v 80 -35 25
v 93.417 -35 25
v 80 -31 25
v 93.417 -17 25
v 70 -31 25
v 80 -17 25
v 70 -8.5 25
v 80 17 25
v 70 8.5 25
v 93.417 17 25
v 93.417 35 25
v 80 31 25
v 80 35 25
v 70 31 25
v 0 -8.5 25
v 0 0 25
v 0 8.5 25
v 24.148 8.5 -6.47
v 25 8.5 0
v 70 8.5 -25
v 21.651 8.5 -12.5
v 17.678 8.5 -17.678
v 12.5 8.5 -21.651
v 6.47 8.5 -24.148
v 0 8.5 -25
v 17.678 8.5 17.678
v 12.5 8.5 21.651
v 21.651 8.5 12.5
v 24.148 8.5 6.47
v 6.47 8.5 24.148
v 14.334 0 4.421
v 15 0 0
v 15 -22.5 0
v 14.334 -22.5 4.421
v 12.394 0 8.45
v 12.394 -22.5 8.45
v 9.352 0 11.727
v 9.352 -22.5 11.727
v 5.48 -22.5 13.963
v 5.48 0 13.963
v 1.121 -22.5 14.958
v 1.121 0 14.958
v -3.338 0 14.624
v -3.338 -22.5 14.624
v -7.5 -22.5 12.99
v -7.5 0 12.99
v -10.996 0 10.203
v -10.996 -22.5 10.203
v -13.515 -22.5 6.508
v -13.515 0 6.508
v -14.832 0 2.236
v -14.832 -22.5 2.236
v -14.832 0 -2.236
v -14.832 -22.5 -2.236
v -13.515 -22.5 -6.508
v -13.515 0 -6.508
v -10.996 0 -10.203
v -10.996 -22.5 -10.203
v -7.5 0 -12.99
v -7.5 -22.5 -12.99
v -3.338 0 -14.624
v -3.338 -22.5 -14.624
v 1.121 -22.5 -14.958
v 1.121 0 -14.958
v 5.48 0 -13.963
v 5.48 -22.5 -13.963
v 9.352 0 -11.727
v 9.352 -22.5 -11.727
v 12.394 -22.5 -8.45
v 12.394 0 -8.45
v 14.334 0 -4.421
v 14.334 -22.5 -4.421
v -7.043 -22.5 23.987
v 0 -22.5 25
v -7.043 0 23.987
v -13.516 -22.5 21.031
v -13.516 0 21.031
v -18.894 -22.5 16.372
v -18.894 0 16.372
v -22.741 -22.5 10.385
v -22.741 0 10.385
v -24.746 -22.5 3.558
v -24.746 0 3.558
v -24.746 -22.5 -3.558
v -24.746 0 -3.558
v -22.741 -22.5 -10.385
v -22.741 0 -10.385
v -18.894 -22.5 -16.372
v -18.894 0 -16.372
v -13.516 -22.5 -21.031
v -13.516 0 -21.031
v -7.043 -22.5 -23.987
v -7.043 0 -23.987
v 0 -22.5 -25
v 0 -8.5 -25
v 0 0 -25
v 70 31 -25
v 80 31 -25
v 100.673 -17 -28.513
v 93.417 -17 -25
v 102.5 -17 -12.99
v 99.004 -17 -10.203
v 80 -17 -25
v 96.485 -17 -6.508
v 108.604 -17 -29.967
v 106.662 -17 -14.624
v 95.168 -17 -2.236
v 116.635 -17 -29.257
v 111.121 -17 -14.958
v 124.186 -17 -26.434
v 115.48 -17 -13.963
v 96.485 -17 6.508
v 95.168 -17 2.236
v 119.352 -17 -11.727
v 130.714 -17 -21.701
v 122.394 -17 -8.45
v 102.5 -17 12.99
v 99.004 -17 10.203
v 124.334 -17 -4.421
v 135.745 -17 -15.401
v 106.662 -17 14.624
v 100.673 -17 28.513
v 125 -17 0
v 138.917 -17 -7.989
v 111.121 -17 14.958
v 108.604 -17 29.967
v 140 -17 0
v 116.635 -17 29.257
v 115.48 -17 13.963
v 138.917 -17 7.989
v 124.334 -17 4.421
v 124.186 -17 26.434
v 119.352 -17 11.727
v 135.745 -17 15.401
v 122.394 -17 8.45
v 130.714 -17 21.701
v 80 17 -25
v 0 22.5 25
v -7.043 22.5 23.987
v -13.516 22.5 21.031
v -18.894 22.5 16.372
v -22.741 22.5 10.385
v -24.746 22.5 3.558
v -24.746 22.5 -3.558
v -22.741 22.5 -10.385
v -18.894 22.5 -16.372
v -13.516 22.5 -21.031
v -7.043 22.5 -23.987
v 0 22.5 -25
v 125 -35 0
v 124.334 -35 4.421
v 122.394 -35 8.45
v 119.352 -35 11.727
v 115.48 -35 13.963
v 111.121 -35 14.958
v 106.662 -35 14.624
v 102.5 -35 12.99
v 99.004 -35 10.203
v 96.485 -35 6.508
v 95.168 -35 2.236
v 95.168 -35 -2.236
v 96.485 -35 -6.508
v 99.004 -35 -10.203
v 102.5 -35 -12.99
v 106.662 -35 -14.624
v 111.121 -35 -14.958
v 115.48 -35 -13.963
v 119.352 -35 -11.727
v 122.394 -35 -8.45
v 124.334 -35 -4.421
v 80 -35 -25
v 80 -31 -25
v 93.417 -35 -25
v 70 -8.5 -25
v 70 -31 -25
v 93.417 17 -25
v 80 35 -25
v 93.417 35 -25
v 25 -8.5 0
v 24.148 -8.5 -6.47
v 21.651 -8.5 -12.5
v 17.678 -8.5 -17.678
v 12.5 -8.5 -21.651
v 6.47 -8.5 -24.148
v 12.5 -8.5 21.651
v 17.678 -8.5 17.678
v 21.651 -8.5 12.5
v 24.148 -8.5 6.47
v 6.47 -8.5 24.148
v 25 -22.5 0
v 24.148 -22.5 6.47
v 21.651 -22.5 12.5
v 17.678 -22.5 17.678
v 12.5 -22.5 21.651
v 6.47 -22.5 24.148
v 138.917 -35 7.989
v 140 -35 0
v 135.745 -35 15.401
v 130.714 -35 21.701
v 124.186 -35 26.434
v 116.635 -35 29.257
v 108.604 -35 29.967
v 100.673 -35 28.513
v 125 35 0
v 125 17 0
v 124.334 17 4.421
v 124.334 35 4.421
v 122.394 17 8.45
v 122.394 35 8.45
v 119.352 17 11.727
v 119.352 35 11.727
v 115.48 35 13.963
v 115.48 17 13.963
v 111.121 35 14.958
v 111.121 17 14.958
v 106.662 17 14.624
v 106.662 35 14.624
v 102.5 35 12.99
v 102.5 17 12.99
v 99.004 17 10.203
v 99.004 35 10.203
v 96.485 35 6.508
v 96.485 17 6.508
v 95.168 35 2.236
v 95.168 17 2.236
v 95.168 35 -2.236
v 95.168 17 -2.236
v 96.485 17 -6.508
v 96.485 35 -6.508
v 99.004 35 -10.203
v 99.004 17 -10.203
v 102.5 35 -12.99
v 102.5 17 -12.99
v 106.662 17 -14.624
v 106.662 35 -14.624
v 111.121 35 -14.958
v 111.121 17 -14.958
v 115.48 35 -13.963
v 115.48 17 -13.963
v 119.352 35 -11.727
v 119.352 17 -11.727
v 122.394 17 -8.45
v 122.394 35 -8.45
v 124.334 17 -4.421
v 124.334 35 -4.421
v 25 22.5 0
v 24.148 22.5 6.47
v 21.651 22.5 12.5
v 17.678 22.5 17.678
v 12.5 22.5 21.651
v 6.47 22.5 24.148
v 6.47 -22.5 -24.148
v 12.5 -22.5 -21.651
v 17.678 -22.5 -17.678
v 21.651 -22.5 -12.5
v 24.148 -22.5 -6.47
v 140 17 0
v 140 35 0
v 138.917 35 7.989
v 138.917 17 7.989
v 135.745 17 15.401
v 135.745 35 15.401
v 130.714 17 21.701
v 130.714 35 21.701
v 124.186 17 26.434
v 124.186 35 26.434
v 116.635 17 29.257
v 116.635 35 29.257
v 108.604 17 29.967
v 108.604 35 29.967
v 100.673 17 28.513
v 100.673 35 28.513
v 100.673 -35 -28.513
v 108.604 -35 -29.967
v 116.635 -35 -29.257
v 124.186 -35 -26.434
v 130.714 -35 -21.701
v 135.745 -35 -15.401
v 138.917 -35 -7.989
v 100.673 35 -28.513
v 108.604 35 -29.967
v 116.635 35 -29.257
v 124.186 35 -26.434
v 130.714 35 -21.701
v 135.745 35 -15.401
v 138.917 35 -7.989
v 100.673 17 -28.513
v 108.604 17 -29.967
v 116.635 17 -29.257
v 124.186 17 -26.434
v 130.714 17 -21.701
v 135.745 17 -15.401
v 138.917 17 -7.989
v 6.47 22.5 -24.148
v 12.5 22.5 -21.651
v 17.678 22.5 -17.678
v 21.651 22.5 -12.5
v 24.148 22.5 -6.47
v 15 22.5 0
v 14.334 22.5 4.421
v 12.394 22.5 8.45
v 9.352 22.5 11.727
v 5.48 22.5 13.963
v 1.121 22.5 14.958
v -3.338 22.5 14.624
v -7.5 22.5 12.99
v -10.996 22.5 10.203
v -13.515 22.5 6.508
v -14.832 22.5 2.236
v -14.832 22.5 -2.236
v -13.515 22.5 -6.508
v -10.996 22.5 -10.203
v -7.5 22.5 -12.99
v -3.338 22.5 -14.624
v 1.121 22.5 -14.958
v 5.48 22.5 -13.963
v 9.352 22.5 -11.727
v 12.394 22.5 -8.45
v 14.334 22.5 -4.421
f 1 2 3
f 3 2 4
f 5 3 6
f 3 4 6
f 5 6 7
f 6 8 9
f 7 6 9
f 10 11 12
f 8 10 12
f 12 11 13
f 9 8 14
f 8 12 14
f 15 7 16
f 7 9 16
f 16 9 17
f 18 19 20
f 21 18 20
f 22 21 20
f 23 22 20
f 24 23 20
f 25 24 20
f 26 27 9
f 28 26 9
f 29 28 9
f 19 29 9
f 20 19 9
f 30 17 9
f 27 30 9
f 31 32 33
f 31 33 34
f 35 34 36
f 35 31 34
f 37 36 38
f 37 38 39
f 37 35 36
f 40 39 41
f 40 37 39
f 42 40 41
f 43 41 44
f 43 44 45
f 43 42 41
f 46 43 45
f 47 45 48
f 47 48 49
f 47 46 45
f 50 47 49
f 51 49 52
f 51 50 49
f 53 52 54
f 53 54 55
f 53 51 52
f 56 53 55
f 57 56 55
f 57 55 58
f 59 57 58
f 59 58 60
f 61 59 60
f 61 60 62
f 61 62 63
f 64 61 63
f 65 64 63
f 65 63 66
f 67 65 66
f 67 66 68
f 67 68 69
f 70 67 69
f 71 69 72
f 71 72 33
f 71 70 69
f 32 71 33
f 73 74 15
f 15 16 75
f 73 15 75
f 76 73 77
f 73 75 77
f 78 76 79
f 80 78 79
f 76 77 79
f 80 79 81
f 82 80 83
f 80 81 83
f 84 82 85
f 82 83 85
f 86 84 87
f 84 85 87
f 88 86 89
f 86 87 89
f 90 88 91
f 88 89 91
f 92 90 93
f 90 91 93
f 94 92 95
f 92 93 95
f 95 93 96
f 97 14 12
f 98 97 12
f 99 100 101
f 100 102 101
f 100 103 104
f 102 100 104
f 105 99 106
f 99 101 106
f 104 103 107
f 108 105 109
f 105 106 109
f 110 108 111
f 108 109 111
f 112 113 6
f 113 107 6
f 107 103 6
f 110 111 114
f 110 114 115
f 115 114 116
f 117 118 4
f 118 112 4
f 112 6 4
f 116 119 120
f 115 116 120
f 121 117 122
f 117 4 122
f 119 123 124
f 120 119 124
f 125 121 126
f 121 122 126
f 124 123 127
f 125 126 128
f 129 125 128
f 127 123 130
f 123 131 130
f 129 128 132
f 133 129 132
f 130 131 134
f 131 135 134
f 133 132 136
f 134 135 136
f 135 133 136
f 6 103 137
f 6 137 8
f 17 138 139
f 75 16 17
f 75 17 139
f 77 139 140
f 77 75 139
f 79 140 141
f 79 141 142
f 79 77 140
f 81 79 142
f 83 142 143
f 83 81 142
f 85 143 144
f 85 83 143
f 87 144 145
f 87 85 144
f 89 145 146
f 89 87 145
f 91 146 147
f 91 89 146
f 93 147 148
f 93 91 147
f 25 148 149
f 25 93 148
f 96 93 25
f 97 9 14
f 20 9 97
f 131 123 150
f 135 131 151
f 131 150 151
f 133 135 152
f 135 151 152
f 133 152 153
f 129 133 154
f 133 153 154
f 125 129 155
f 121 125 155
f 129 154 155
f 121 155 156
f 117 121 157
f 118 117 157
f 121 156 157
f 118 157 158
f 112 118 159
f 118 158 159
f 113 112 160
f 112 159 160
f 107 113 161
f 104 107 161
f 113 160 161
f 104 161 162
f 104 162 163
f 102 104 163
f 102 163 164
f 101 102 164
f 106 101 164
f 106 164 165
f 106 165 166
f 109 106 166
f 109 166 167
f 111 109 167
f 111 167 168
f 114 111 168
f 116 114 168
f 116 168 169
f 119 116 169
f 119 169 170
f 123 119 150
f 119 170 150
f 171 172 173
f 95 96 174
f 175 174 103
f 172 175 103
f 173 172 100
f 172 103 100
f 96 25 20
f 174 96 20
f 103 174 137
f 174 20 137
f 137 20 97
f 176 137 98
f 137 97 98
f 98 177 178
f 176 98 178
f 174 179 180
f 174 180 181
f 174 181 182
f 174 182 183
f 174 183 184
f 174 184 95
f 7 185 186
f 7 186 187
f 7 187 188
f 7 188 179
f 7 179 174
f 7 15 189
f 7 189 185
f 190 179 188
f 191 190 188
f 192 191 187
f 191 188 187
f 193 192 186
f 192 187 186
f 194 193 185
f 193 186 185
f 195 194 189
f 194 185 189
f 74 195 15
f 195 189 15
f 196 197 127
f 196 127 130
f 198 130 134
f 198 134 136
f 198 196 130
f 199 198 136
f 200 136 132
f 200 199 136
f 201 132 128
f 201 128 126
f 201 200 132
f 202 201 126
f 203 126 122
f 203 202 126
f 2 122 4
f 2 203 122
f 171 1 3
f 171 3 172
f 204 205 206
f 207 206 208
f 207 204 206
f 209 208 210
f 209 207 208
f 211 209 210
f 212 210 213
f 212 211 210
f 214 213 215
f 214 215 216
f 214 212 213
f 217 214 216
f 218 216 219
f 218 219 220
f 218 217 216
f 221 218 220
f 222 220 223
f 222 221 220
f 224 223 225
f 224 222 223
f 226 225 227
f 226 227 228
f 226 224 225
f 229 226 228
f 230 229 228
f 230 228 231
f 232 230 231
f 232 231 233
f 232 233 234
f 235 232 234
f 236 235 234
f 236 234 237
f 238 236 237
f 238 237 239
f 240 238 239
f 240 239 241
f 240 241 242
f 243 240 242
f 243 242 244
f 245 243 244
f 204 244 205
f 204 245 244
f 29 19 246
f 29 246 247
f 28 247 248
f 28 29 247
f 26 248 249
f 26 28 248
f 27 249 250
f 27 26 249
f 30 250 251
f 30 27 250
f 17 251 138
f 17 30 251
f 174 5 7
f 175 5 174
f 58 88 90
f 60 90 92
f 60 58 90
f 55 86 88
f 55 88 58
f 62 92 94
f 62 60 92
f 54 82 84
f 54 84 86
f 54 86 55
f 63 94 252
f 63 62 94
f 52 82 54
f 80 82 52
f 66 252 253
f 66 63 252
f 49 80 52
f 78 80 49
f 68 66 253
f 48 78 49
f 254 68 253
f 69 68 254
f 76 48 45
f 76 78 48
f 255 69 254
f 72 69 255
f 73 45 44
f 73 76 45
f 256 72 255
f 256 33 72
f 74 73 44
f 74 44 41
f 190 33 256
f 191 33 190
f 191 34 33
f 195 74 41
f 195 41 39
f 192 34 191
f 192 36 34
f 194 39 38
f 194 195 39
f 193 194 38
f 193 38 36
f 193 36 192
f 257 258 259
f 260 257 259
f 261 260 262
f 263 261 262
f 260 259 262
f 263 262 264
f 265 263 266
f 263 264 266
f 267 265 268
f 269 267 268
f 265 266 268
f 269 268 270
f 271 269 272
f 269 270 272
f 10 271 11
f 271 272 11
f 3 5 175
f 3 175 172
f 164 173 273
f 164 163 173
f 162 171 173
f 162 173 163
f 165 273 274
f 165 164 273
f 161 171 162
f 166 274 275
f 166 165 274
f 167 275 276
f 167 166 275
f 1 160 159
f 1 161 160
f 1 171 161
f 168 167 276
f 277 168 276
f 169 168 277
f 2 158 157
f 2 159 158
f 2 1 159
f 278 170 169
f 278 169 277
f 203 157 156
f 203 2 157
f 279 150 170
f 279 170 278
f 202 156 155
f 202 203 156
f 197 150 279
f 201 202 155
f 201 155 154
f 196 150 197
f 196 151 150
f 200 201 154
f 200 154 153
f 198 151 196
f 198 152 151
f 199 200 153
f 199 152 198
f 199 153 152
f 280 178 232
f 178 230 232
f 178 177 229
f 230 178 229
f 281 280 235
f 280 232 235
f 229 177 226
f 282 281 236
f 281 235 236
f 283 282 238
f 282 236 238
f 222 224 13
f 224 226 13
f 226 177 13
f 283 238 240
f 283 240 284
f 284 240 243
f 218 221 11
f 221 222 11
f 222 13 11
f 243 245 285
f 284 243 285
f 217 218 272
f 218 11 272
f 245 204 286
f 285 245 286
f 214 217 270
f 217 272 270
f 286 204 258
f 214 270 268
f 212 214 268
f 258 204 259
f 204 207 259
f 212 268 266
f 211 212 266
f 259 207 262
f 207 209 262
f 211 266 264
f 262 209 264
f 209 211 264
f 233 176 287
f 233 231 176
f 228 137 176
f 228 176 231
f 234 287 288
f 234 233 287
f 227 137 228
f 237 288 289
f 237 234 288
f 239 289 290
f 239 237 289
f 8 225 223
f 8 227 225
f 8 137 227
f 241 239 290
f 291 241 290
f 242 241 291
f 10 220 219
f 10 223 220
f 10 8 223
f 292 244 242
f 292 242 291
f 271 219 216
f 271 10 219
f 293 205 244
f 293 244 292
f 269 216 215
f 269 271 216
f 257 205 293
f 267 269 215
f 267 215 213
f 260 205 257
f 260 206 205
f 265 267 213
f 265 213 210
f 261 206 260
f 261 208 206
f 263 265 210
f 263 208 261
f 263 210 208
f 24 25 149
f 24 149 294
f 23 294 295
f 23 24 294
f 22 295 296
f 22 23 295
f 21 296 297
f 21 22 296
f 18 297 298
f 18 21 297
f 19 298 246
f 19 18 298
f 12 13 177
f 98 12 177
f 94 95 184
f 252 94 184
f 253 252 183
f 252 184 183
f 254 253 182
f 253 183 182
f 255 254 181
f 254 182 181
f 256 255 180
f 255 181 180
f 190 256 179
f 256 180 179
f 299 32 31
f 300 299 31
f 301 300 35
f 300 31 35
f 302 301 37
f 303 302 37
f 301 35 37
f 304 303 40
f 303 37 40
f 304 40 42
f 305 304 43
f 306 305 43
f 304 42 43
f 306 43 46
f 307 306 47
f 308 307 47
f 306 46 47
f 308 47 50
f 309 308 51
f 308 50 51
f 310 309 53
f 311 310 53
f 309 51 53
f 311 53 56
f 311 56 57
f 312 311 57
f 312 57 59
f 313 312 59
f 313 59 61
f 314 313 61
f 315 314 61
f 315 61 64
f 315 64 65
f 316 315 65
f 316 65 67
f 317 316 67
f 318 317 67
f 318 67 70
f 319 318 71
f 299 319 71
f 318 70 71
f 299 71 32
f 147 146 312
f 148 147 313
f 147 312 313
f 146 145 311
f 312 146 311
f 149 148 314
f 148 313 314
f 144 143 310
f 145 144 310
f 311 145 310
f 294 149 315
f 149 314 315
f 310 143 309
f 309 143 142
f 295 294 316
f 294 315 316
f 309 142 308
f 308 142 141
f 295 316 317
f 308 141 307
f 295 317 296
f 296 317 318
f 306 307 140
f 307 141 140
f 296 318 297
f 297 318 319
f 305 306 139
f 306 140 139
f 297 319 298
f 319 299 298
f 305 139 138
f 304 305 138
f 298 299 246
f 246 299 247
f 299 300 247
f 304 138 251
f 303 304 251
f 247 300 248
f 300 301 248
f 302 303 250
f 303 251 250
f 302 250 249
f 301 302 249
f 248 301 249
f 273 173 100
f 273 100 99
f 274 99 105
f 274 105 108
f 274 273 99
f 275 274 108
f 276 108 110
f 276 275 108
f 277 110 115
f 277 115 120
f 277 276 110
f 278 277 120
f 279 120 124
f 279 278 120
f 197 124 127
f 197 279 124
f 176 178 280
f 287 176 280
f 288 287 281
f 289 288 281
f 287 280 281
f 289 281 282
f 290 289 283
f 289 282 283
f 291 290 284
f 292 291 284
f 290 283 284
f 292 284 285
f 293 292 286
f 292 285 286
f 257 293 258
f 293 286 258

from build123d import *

# Parameters (mm, degrees)
F0_R     = 15
F1_DEPTH = 22.5
F2_DEPTH = 8.5
F3_DEPTH = 31
F5_R     = 15
F6_DEPTH = 18


# Not quite as in the source:
# - a pattern or mirror of a feature is missing from the dataset's text; its kind, count and spacing are read off the source's solid


with BuildPart() as f1:
    # F0 (on Front) → F1 (new body, symmetric)
    with BuildSketch(Plane.XZ):
        with BuildLine():
            ThreePointArc((0, -25), (17.6776695297, -17.6776695297), (25, 0))
            ThreePointArc((25, 0), (17.6776695297, 17.6776695297), (0, 25))
            ThreePointArc((0, 25), (-25, 0), (0, -25))
        make_face()
        Circle(F0_R, mode=Mode.SUBTRACT)
    extrude(amount=F1_DEPTH, both=True)

    # F0 (on Front) → F2 (join, symmetric)
    with BuildSketch(Plane.XZ):
        with BuildLine():
            ThreePointArc((0, 25), (17.6776695297, 17.6776695297), (25, 0))
            ThreePointArc((25, 0), (17.6776695297, -17.6776695297), (0, -25))
            Line((0, -25), (70, -25))
            Line((70, -25), (70, 25))
            Line((70, 25), (0, 25))
        make_face()
    extrude(amount=F2_DEPTH, both=True)

    # F0 (on Front) → F3 (join, symmetric)
    with BuildSketch(Plane.XZ):
        Polygon((80, 25), (70, 25), (70, -25), (80, -25), (80, 0), align=None)
    extrude(amount=F3_DEPTH, both=True)

    # F5 (on offset) → F6 (join)
    with BuildSketch(Plane.XZ.offset(35)):
        with BuildLine():
            ThreePointArc((93.4168760482, -25), (124.1863716546, -26.4338203685), (140, 0))
            ThreePointArc((140, 0), (124.1863716546, 26.4338203685), (93.4168760482, 25))
            ThreePointArc((93.4168760482, 25), (83.5661796315, 14.1863716546), (80, 0))
            ThreePointArc((80, 0), (83.5661796315, -14.1863716546), (93.4168760482, -25))
        make_face()
        with Locations((110, 0)):
            Circle(F5_R, mode=Mode.SUBTRACT)
        with BuildLine():
            ThreePointArc((80, 0), (83.5661796315, 14.1863716546), (93.4168760482, 25))
            Line((93.4168760482, 25), (80, 25))
            Line((80, 25), (80, 0))
        make_face()
        with BuildLine():
            Line((80, -25), (93.4168760482, -25))
            ThreePointArc((93.4168760482, -25), (83.5661796315, -14.1863716546), (80, 0))
            Line((80, 0), (80, -25))
        make_face()
    f6 = extrude(amount=-F6_DEPTH)

    # F6_copies: F6 across plane
    add(f6.mirror(Plane.ZX))


solid = f1.part
